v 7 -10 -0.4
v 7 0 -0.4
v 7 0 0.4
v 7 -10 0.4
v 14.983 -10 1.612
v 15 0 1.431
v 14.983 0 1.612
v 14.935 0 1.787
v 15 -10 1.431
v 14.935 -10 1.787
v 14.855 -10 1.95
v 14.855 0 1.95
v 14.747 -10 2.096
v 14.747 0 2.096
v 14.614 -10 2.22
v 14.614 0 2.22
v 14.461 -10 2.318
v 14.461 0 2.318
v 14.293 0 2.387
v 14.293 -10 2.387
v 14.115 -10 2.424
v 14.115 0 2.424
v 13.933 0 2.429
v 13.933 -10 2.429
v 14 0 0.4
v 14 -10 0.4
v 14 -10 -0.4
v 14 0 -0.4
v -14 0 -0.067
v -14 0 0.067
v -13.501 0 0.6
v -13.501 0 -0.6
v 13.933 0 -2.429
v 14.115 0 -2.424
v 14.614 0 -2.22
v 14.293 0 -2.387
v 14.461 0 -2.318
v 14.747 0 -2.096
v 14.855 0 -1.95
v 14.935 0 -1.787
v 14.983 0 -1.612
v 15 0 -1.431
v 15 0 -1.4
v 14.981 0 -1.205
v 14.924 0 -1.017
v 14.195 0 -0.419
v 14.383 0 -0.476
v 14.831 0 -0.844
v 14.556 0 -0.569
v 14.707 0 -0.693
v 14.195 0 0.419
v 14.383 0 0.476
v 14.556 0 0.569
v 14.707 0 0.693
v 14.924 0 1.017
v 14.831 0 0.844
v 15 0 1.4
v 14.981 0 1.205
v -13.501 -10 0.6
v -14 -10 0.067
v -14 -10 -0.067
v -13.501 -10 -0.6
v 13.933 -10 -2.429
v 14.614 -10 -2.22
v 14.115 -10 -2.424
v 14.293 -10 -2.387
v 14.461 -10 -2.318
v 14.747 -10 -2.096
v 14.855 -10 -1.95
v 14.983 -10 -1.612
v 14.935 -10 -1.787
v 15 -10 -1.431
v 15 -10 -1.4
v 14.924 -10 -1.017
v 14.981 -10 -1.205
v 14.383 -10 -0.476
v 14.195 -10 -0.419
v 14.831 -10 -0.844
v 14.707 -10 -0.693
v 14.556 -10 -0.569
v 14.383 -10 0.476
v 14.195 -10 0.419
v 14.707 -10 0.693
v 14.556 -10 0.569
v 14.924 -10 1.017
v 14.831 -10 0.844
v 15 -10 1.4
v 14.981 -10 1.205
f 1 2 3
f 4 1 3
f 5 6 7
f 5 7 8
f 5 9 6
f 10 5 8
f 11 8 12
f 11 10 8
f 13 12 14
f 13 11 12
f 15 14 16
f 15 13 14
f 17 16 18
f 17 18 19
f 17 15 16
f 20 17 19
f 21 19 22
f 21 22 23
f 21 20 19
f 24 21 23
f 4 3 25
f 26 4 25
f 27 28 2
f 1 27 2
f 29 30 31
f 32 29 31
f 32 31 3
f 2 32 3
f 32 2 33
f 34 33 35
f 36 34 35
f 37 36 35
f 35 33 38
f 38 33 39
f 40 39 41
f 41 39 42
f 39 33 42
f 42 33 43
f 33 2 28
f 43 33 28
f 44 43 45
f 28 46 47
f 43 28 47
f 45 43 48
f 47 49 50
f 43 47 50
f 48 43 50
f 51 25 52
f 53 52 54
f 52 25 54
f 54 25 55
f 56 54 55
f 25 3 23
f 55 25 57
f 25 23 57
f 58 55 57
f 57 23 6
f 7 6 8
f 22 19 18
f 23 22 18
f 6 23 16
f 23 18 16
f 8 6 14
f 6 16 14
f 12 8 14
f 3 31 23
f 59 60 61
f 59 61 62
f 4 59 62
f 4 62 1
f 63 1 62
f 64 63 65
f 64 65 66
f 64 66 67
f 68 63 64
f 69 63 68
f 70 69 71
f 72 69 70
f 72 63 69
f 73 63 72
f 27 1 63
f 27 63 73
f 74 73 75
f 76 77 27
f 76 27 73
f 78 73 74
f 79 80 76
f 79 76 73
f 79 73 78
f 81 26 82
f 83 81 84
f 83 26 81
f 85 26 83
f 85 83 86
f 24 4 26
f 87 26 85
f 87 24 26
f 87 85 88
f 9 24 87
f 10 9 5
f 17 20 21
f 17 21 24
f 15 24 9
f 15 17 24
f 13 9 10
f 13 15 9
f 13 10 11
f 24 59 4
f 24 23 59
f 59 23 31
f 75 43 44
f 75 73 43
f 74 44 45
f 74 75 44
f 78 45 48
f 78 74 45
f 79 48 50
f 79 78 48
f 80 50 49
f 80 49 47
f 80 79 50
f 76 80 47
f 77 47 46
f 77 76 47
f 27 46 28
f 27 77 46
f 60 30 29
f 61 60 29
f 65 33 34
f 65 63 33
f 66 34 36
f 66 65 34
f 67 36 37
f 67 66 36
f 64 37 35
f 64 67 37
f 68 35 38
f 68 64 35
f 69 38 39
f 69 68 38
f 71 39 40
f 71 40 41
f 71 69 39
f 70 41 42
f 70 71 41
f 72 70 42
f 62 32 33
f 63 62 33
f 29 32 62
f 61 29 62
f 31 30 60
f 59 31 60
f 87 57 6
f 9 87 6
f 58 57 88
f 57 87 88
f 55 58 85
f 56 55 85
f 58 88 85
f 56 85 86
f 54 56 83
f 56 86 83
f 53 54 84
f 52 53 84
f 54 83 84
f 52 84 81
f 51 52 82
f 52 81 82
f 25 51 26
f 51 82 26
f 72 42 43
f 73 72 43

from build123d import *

# Parameters (mm, degrees)
F1_DEPTH = 10
F2_R     = 1
F3_SIZE  = 0.5


with BuildPart() as f1:
    # F0 (on Front) → F1 (new body)
    with BuildSketch(Plane.XZ):
        Polygon((15, 0.4), (15, 2.5), (-14, 0.566667), (-14, 0), (-14, -0.566667), (15, -2.5), (15, -0.4), (7, -0.4), (7, 0.4), align=None)
    extrude(amount=F1_DEPTH)

    # F2
    f2_edges = [f1.edges().sort_by_distance(p)[0] for p in [
        (15, -5, -0.4),
        (15, -5, 0.4),
        (15, -5, -2.5),
        (15, -5, 2.5),
    ]]
    fillet(f2_edges, radius=F2_R)

    # F3
    f3_edges = [f1.edges().sort_by_distance(p)[0] for p in [
        (-14, -5, 0.566667),
        (-14, -5, -0.566667),
    ]]
    chamfer(f3_edges, length=F3_SIZE)


solid = f1.part
